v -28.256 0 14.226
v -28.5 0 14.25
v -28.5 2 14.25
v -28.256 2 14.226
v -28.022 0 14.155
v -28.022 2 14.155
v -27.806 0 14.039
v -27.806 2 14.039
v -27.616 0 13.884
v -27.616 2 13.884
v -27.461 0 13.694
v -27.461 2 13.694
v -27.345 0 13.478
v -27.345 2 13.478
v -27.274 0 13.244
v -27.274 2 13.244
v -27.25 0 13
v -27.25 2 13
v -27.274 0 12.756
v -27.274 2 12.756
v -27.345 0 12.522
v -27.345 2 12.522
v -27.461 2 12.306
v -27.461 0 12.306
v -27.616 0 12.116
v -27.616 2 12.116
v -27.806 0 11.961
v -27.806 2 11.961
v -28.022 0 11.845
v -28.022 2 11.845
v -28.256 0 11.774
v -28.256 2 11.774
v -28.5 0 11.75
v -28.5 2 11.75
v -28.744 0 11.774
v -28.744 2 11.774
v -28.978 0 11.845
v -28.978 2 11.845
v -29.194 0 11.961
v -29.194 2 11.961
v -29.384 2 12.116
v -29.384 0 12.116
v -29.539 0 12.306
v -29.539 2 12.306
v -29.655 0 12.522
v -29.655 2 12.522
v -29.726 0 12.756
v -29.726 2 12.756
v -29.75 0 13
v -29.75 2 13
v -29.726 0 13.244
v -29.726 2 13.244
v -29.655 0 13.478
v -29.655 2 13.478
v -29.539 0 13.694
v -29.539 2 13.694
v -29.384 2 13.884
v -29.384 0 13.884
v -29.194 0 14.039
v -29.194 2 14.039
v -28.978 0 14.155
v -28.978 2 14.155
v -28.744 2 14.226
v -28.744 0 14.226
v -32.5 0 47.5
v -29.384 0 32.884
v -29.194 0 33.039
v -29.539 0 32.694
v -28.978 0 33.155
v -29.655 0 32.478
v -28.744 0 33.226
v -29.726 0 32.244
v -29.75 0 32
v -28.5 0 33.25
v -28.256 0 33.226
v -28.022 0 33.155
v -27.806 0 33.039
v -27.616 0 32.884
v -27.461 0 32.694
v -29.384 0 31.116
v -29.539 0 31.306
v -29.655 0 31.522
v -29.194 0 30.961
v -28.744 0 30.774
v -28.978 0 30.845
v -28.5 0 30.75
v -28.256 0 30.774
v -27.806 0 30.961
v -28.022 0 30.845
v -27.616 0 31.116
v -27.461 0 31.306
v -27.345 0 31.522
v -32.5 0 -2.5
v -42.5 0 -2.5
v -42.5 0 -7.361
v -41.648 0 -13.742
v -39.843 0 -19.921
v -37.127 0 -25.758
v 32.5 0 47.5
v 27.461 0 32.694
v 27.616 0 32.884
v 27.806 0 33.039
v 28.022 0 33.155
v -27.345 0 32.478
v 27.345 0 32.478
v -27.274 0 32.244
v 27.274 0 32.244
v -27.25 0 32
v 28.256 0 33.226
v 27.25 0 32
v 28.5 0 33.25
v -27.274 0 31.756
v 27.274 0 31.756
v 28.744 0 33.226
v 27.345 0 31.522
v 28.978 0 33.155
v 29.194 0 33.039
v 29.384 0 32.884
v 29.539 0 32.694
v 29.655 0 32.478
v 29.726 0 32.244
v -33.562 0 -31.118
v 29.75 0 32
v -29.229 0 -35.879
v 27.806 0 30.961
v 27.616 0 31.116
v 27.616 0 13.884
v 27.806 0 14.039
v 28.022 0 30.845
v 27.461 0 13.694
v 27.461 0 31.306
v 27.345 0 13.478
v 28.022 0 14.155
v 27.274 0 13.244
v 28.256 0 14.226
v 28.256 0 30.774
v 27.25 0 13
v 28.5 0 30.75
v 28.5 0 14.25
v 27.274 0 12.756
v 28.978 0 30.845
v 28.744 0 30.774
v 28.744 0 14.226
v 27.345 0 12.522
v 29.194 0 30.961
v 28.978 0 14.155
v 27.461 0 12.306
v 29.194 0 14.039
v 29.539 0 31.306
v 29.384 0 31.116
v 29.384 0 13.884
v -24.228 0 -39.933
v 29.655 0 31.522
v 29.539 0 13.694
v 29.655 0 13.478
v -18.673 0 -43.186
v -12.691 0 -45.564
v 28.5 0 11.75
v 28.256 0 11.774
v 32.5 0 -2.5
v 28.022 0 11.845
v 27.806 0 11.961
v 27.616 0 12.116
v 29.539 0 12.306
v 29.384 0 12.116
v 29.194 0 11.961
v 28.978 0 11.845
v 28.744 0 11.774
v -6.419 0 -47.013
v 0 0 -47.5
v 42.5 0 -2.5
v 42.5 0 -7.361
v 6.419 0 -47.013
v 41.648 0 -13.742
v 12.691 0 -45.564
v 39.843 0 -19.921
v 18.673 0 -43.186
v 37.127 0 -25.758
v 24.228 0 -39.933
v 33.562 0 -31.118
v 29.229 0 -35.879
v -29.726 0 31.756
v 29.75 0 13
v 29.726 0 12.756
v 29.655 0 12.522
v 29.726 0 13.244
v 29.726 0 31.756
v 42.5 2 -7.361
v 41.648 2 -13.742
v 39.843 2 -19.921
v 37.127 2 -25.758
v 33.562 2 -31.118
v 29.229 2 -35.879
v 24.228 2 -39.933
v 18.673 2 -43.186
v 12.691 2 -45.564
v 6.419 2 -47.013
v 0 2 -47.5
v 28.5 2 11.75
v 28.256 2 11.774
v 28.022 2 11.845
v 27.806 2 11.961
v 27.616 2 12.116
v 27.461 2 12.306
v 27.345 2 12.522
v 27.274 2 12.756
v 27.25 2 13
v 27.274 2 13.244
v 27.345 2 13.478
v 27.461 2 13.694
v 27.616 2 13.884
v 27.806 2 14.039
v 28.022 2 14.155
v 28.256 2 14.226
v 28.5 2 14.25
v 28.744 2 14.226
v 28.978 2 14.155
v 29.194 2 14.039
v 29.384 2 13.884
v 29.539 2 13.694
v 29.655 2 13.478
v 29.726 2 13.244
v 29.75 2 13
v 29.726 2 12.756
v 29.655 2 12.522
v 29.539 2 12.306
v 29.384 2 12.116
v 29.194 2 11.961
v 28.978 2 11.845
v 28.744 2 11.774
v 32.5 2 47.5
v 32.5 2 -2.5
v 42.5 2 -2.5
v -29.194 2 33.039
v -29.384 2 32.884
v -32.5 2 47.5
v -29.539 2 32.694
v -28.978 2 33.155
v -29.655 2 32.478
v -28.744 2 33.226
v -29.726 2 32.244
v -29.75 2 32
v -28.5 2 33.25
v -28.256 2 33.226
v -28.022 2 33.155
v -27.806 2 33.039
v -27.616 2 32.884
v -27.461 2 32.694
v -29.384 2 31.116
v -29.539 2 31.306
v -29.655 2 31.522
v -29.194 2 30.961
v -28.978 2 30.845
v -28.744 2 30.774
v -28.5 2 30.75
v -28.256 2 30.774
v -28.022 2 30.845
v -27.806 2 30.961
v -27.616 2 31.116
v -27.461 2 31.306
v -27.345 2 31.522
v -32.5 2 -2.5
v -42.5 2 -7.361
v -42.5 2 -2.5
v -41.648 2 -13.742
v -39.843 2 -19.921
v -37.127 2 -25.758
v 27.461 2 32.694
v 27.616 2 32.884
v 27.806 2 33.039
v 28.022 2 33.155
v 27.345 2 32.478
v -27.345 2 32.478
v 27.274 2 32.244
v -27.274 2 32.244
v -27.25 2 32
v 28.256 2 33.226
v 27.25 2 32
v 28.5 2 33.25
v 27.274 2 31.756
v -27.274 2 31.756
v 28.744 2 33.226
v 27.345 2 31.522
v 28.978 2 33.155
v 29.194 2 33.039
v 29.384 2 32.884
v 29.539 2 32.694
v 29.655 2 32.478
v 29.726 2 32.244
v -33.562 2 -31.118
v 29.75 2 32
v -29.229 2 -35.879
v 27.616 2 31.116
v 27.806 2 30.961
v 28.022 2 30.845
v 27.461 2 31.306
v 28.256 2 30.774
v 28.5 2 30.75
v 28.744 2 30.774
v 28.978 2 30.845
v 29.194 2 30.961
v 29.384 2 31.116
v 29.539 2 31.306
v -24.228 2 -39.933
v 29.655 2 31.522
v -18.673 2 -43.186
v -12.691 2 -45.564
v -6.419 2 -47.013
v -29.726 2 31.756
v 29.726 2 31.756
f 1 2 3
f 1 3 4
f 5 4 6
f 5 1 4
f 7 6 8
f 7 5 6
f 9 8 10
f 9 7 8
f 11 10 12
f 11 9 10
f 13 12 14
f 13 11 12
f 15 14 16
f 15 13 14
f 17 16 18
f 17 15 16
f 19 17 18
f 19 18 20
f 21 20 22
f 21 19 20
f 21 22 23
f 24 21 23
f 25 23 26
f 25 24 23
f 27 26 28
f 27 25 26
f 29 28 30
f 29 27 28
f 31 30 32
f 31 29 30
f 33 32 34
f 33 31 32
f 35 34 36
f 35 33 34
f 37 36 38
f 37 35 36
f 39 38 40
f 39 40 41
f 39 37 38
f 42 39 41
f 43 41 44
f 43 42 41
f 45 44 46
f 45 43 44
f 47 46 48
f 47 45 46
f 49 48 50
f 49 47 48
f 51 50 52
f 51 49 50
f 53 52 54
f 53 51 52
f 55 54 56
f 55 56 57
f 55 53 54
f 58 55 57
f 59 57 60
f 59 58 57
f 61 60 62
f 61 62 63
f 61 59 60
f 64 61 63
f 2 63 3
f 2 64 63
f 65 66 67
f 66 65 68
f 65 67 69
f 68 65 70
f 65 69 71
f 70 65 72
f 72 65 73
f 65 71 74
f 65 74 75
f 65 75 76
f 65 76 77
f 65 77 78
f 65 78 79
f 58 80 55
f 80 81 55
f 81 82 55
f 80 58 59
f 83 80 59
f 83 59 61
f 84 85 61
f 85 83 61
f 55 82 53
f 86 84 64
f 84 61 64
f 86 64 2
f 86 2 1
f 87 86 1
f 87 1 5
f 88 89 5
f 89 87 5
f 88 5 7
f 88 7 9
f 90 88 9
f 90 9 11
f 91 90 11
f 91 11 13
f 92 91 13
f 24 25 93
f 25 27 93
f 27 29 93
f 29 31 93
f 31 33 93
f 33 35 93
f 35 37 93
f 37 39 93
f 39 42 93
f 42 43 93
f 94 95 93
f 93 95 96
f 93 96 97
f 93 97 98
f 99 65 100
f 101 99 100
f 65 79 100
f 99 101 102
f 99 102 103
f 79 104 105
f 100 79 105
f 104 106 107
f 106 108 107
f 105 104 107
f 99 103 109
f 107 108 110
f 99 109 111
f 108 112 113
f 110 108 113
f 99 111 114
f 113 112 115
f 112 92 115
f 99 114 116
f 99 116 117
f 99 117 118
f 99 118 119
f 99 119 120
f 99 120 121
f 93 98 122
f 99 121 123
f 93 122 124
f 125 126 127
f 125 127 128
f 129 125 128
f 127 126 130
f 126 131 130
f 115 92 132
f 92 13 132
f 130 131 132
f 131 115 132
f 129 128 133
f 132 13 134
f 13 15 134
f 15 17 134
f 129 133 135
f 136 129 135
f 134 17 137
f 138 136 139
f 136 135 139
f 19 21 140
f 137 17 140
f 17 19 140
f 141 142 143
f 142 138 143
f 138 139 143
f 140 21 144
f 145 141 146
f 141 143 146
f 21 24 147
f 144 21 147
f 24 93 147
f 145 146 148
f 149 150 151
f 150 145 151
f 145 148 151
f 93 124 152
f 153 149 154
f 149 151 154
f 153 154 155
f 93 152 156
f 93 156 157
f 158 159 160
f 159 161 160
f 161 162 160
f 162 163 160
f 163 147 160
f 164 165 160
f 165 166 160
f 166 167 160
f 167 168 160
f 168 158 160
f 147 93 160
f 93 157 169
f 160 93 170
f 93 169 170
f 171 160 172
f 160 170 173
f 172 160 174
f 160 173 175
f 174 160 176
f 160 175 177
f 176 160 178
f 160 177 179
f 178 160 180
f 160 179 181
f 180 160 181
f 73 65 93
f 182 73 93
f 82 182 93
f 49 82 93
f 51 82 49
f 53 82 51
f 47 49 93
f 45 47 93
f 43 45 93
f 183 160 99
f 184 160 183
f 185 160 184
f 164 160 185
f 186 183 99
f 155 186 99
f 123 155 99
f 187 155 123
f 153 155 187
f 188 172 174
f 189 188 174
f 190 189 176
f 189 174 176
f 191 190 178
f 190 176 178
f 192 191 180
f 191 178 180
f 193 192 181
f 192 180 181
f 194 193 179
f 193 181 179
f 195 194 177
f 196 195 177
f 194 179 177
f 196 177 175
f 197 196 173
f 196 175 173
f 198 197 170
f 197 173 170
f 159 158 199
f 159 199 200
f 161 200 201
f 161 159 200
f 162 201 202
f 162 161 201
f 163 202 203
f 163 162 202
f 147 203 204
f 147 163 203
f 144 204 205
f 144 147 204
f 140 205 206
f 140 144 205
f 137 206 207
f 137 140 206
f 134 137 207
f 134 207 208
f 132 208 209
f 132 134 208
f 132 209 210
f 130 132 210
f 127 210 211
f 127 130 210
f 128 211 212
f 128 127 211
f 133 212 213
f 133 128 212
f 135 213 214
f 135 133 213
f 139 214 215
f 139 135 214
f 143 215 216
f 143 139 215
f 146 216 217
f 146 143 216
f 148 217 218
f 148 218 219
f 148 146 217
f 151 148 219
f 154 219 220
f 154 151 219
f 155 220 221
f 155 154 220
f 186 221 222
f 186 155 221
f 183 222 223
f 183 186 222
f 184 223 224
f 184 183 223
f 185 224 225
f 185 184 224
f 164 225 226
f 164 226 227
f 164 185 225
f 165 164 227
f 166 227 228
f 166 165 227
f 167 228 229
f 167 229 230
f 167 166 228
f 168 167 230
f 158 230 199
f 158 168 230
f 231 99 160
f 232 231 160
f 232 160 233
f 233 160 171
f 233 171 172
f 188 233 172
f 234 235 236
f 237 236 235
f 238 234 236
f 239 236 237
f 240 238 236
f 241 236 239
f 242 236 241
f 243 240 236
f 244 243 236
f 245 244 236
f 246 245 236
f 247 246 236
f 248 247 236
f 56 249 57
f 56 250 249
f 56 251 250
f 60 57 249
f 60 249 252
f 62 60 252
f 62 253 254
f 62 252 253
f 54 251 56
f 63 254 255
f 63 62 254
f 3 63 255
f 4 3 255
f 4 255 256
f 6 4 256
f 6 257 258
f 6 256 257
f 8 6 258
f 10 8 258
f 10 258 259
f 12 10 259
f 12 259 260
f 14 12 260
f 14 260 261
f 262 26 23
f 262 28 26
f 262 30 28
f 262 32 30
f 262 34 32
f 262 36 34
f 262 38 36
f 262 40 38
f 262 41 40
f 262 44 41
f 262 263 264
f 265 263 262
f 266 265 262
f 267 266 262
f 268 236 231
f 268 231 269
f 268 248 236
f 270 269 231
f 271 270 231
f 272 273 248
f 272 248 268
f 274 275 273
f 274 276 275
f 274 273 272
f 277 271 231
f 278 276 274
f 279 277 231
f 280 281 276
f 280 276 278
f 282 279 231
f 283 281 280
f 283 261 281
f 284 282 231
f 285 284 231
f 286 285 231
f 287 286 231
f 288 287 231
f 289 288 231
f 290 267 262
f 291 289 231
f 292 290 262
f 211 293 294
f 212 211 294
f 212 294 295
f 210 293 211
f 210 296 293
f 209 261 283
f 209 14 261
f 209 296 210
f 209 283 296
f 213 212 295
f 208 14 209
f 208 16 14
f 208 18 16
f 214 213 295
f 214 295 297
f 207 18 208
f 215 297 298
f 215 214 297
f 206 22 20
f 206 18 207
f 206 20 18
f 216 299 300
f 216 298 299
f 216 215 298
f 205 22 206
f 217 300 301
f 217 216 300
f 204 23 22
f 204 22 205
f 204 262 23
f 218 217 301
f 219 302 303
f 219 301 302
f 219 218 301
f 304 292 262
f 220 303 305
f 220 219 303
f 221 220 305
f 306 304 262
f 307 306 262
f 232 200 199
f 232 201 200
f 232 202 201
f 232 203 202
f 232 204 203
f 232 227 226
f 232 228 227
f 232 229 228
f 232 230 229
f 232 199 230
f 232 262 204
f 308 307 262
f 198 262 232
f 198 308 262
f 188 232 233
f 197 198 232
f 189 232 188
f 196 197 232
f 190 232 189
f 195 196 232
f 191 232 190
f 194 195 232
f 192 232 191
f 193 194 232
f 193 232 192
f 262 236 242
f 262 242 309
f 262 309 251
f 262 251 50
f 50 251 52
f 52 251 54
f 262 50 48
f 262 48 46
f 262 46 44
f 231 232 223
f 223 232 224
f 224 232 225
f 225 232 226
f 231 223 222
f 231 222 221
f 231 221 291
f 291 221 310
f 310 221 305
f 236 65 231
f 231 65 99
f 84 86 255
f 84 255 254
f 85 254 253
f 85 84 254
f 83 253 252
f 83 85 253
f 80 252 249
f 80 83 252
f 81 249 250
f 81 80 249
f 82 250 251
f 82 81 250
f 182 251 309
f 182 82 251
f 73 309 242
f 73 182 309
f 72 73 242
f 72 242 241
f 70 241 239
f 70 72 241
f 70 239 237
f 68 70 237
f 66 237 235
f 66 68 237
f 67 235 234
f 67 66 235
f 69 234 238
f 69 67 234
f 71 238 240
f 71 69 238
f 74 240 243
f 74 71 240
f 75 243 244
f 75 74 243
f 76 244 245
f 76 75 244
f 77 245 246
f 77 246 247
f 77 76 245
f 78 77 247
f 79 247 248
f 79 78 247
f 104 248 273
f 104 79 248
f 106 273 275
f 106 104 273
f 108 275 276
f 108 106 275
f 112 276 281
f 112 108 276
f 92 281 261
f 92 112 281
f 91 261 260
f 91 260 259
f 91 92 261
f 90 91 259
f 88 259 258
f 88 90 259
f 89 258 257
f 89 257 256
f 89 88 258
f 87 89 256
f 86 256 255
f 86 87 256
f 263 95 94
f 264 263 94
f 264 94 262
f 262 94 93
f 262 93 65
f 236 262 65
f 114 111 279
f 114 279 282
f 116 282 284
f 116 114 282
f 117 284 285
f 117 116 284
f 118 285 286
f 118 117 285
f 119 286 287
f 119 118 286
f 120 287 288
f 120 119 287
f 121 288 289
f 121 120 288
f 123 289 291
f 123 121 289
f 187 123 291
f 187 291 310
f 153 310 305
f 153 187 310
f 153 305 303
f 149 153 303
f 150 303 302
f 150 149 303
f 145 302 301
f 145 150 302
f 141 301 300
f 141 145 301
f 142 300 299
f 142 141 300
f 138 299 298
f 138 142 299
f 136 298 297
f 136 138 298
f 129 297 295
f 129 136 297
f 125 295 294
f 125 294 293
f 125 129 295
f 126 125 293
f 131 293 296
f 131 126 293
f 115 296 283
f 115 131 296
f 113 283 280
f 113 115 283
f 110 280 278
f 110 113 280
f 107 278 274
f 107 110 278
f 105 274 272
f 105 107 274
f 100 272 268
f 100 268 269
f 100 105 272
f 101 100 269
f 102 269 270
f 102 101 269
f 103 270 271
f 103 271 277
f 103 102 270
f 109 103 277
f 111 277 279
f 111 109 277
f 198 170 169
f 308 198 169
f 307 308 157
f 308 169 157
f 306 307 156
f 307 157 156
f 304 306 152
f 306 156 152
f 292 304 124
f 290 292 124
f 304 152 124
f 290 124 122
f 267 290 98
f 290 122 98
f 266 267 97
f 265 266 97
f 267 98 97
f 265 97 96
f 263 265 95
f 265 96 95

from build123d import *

# Parameters (mm, degrees)
BOSS_EXTRUDE1_DEPTH = 2
SKETCH2_R           = 1.25
CUT_EXTRUDE1_DEPTH  = 2


with BuildPart() as part:
    # Sketch1 → Boss-Extrude1 (new body)
    with BuildSketch(Plane(origin=(0, 0, 0), x_dir=(1, 0, 0), z_dir=(0, 1, 0))):
        with BuildLine():
            Line((-32.5, 2.5), (-32.5, -47.5))
            Line((-32.5, -47.5), (32.5, -47.5))
            Line((32.5, -47.5), (32.5, 2.5))
            Line((32.5, 2.5), (42.5, 2.5))
            Line((42.5, 2.5), (42.5, 7.361111111))
            ThreePointArc((42.5, 7.361111111), (29.229182401, 35.879101507), (1.65e-07, 47.5))
            ThreePointArc((1.65e-07, 47.5), (-29.229182281, 35.87910162), (-42.5, 7.361111111))
            Line((-42.5, 7.361111111), (-42.5, 2.5))
            Line((-42.5, 2.5), (-32.5, 2.5))
        make_face()
    extrude(amount=BOSS_EXTRUDE1_DEPTH)

    # Sketch2 → Cut-Extrude1 (cut)
    with BuildSketch(Plane(origin=(0, 0, 0), x_dir=(1, 0, 0), z_dir=(0, 1, 0))):
        with Locations(Location((-28.5, -13, 0), (0, 0, 270))):
            Circle(SKETCH2_R)
        with Locations(Location((-28.5, -32, 0), (0, 0, 90))):
            Circle(SKETCH2_R)
        with Locations(Location((28.5, -32, 0), (0, 0, 270))):
            Circle(SKETCH2_R)
        with Locations(Location((28.5, -13, 0), (0, 0, 90))):
            Circle(SKETCH2_R)
    extrude(amount=CUT_EXTRUDE1_DEPTH, mode=Mode.SUBTRACT)


solid = part.part
